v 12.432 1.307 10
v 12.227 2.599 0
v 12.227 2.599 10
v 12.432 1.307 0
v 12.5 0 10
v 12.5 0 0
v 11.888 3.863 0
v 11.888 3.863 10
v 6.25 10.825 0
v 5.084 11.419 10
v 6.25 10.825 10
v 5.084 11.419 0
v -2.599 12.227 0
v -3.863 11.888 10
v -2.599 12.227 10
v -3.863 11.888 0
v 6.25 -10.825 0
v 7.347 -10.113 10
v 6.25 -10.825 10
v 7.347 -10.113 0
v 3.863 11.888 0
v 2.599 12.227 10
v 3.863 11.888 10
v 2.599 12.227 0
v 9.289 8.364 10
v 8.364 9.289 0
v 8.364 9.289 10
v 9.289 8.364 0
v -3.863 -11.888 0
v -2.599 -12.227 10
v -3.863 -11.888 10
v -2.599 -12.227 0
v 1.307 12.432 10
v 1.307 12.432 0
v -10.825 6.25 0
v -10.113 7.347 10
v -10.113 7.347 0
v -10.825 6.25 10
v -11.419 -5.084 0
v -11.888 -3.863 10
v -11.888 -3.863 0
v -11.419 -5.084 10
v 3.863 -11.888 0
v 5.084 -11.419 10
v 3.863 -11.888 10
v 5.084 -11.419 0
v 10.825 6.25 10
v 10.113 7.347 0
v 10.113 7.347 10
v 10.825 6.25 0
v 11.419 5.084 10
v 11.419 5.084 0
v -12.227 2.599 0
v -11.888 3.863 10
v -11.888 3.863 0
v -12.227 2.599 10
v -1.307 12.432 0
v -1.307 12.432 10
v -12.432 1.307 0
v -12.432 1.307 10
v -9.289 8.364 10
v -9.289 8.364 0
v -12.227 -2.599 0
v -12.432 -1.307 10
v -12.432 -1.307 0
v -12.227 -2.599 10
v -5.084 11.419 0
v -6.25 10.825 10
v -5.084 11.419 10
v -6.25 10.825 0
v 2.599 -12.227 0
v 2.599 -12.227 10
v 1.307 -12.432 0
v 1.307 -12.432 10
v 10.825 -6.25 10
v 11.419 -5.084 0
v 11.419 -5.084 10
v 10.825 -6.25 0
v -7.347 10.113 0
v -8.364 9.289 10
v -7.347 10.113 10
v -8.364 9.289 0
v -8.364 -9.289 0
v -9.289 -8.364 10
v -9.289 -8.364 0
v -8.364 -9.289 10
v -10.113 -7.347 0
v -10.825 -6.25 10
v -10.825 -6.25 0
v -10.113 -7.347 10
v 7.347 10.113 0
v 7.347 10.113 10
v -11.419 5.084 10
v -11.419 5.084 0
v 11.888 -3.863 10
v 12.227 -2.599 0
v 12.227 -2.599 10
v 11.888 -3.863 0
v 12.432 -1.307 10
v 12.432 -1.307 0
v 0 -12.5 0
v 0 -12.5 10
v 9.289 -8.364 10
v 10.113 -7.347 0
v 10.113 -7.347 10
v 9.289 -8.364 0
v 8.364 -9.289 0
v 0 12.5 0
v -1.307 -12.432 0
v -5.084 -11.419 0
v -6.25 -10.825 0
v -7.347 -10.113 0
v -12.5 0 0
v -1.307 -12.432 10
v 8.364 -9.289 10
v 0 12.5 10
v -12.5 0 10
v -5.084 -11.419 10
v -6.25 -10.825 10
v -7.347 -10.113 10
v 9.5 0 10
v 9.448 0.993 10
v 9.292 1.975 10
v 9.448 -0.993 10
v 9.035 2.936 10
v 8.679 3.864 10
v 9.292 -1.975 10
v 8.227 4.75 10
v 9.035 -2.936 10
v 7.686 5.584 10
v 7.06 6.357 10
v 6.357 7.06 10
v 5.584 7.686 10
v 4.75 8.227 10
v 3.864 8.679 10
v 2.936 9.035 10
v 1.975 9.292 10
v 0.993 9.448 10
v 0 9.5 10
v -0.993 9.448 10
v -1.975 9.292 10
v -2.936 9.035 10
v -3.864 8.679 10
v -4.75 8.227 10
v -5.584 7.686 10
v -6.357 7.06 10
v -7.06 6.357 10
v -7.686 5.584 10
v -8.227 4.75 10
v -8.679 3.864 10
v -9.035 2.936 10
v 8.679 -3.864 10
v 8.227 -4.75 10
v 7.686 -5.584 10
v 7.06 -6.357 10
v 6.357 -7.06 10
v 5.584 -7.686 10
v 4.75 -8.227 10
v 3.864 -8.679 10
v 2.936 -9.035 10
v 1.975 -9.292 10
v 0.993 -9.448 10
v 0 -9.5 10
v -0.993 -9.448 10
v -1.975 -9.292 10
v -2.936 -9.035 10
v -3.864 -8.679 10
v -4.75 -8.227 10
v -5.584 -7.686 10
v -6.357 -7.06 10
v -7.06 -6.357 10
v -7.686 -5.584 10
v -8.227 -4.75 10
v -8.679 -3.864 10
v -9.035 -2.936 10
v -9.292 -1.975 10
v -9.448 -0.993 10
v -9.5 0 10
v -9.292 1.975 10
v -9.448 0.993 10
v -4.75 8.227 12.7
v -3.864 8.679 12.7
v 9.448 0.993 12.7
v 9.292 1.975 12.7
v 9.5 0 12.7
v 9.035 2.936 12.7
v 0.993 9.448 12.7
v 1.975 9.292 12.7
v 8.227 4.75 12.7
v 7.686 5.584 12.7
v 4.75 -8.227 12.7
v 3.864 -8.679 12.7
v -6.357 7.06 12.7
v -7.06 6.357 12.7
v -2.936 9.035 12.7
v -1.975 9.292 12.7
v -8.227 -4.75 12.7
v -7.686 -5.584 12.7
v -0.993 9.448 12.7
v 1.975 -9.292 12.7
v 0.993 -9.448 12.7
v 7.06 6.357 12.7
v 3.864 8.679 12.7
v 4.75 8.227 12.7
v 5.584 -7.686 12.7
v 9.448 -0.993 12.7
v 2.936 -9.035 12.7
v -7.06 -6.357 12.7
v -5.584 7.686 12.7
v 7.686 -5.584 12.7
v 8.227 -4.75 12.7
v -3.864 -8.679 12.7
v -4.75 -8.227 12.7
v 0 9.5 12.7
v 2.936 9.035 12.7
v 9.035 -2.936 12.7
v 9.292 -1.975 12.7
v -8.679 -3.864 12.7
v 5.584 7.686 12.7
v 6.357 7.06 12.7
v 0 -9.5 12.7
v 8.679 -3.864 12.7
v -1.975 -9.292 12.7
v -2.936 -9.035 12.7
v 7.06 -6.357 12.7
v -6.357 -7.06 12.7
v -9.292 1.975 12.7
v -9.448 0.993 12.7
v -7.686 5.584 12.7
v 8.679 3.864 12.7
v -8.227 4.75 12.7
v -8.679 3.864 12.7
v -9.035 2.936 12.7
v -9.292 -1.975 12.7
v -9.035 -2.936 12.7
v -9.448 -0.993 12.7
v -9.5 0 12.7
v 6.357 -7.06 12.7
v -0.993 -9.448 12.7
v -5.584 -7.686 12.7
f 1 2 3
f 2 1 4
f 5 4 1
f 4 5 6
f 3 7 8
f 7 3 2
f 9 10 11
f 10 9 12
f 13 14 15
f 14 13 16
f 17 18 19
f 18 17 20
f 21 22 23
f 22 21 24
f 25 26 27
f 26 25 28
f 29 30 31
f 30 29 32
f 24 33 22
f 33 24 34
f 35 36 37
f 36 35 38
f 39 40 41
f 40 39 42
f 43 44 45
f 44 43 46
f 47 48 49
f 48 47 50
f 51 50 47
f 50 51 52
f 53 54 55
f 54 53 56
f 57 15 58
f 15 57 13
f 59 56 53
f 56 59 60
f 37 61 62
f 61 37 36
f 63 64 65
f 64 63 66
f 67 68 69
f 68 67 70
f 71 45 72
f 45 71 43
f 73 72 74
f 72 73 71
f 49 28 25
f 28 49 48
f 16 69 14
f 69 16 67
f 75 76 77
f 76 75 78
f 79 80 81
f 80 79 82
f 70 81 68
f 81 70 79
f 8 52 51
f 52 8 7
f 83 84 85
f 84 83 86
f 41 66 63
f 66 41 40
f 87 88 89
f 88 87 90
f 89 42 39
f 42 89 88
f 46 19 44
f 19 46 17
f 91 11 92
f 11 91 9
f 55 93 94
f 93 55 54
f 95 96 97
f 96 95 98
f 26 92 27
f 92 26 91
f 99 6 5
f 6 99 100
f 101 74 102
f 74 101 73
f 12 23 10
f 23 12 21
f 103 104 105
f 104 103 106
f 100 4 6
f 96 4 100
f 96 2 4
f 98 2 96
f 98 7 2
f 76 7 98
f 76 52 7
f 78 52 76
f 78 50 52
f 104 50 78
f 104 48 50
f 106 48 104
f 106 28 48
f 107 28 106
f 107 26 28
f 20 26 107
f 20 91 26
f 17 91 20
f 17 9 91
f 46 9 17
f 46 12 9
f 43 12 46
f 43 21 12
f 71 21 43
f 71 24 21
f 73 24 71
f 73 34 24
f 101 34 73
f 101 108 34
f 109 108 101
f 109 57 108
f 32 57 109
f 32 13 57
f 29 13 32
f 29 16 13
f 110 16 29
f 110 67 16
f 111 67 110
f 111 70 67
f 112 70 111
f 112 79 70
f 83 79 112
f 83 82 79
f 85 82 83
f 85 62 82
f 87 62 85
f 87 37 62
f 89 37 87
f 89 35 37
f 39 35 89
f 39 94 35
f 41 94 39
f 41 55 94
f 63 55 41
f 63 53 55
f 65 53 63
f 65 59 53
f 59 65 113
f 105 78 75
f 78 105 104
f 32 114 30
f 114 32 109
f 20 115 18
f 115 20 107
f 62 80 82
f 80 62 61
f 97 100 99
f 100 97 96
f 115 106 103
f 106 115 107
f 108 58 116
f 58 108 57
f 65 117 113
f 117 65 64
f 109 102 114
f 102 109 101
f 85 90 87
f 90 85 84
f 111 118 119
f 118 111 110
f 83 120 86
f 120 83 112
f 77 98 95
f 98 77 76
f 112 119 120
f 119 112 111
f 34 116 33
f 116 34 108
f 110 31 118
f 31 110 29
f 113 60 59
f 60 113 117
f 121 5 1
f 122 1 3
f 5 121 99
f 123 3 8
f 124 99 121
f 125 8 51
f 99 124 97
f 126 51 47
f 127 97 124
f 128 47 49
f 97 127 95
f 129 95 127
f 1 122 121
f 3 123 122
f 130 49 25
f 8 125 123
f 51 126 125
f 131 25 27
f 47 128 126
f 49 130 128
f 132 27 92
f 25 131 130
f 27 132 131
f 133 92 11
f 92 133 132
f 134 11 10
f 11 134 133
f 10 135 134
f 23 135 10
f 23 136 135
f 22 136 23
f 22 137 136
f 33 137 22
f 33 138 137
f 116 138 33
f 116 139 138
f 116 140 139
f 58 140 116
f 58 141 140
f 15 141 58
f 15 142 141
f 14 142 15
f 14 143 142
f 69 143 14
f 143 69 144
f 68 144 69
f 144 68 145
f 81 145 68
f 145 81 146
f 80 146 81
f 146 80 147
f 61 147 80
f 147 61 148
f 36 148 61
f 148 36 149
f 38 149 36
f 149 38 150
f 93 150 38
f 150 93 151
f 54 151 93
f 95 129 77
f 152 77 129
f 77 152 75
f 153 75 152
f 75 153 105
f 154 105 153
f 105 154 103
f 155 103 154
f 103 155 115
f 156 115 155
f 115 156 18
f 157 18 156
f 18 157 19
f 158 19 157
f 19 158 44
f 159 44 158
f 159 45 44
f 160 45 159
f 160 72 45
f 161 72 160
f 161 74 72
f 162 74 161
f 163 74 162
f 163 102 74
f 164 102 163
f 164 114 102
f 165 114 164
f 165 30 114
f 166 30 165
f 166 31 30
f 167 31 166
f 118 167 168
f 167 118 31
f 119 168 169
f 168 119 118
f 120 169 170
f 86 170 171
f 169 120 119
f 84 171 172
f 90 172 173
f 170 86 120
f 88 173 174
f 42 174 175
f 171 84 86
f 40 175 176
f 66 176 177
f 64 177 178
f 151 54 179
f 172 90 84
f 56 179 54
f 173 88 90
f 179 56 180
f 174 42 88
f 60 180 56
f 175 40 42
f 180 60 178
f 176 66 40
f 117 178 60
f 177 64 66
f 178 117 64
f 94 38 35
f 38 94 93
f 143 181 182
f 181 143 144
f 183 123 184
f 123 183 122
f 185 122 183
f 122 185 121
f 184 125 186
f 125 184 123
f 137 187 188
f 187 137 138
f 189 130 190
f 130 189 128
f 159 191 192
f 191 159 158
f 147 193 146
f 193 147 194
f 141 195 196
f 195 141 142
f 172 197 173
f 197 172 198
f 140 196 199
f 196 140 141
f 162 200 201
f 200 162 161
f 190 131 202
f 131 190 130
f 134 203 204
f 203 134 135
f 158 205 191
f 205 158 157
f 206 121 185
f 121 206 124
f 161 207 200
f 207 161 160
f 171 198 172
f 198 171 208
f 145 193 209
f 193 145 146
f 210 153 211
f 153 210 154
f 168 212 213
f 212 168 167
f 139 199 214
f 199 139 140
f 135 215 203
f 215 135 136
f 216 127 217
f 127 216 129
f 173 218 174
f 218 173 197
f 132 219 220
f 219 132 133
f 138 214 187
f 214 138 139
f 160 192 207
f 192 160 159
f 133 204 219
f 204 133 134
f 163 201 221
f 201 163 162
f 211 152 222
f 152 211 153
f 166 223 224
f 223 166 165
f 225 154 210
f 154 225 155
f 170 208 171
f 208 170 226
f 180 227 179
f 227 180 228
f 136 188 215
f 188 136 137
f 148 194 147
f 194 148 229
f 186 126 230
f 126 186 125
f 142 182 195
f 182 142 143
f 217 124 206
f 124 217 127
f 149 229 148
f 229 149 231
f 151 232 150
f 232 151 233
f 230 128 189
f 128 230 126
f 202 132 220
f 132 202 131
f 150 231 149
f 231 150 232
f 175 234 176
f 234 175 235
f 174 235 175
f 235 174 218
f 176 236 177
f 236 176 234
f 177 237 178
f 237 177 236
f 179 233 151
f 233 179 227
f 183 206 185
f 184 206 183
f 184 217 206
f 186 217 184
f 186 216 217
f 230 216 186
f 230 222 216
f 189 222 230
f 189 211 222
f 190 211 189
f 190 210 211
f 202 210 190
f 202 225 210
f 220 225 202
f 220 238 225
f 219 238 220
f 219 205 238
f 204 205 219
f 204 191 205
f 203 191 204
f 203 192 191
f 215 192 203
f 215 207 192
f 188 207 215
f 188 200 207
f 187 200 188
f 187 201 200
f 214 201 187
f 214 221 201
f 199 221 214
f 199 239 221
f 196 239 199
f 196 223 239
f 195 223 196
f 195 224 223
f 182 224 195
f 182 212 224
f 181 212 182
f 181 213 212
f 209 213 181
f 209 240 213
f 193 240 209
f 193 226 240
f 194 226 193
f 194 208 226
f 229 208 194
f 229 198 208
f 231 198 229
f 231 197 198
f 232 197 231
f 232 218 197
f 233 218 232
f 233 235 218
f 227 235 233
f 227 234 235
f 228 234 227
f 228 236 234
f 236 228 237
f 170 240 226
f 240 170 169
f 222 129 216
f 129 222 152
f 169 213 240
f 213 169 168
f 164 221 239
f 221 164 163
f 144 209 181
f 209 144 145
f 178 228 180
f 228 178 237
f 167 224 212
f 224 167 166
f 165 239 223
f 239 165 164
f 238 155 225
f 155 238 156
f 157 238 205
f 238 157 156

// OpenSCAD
// Print using Flexible Filament (TPU)

include <MCAD/units.scad>

feetUpperRadius = 9.5;
feetLowerRadius = 12.5;
feetLowerHeight = 10;
feetUpperHeight = 2.7;

module TrumpetStandFoot() {
    $fn=60;

    cylinder(h=feetLowerHeight, r=feetLowerRadius);

    translate([0, 0, feetLowerHeight])
    cylinder(h=feetUpperHeight, r=feetUpperRadius);
}

TrumpetStandFoot();
